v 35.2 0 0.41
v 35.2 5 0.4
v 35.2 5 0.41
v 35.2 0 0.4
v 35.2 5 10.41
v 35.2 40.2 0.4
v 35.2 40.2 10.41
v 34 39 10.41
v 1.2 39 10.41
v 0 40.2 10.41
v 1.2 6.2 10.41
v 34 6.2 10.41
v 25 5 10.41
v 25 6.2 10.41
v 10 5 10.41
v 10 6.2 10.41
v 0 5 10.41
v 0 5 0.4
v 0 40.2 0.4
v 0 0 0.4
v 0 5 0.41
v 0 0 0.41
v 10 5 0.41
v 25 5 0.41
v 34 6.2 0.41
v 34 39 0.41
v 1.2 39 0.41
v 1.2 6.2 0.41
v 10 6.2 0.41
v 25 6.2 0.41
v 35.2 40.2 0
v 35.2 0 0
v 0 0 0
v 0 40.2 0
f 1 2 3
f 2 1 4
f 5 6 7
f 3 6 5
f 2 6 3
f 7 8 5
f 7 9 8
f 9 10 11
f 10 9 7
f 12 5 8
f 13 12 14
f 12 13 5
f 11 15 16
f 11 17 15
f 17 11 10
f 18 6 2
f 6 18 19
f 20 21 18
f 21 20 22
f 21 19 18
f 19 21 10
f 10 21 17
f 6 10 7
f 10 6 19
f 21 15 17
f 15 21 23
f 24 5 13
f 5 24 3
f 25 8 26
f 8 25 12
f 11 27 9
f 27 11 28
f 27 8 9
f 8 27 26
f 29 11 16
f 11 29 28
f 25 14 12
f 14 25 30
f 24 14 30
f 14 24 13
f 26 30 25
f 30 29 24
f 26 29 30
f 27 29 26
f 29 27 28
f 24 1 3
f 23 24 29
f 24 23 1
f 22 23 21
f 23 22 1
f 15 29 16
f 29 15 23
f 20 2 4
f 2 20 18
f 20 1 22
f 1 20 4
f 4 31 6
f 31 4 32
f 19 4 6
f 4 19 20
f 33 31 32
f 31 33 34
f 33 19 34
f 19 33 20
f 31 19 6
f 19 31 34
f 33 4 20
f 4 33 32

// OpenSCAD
// file: ../../Base/Boxes.scad
// Fischertechnik Box Foundation
// Pre-designed Boxes

use <Constants.scad>

include <PlacementOptions.scad>

box190Width = 190;
box190Depth = 130;
box130Width = 130;
box130Depth = 95;
boxUsageHeight = 33.9;
boxWallThickness = 2.4;
boxBaseThickness = 1.0;
boxWebWidth = 3.0;

// getBoxWallThickness()
// Gets the wall thickness of a Fischertechnik Box

function getBoxWallThickness() = boxWallThickness;

// Gets the usable height of a fischertechnik box
function getBoxUsageHeight() = boxUsageHeight;

// Gets the thickness of the Fischertechnik box base.
function getBoxBaseThickness() = boxBaseThickness;

// Gets the width of a box web
function getBoxWebWidth() = boxWebWidth;

// Gets the usable inner space of a Box 190 as an x/y-list
function getBox190Space() = [
    box190Width - 2*getBoxWallThickness(), 
    box190Depth - 2*getBoxWallThickness() ];

// Imports the Fischertechnik empty box 130x190 mm and places it at position 0,0
// 190x130 are the outer sizes, the inner space is slightly smaller. Use getBox190Space() to get the inner sizes.
// This module needs the STL file "Fischertechnik Box 130x190.stl" in the library path.
// The box is positioned that the usable inner space is at the 0,0,0 position. The

module Box190() {
    translate([-getBoxWallThickness(),-getBoxWallThickness(),-getBoxBaseThickness()])
        import("Fischertechnik Box 130x190.stl", convexity=3);
}

// Gets the usable inner space of a Box 130 as an x/y-list
function getBox130Space() = [
    box130Width - 2*getBoxWallThickness(), 
    box130Depth - 2*getBoxWallThickness() ];

// Imports the Fischertechnik empty box 95x130 mm and places it at position 0,0
// 190x130 are the outer sizes, the inner space is slightly smaller. Use getBox190Space() to get the inner sizes.
// This module needs the STL file "Fischertechnik Box 95x130.stl" in the library path.
// The box is positioned that the usable inner space is at the 0,0,0 position. The

module Box130() {
    translate([-getBoxWallThickness(),-getBoxWallThickness(),-getBoxBaseThickness()])
        import("Fischertechnik Box 95x130.stl", convexity=3);
}

// Creates a web at the specified box walls
// corner 0 = LowerLeft, 1 = UpperLeft, 2 = UpperRight, 3 = LowerRight
// side 0 = LeftOfCorner, 1 = RightOfCorner
// distance = Distance in mm from the corner
// box = inner width and depth of the box (default: Box 190)
// webWidth = length of the web (default is 3 mms)
// webThickness = thickness of the web (default is 1 mm)

module BoxWeb(corner, side, distance, box=getBox190Space(), webWidth=getBoxWebWidth(), webThickness=1.0) {
    sink = getBoxWallThickness()/2;

    width = (corner % 2 == 0) ? 
            (side == LeftOfCorner ? webWidth : webThickness) :
            (side == LeftOfCorner ? webThickness : webWidth);

    depth = (corner % 2 == 0) ? 
            (side == RightOfCorner ? webWidth : webThickness) :
            (side == RightOfCorner ? webThickness : webWidth);
    
    xDiff = corner == LowerLeft ? 
                (side == LeftOfCorner ? -sink : distance) :
            (corner == UpperLeft ?                
                (side == LeftOfCorner ? distance : -sink) :
            (corner == UpperRight ?
                (side == LeftOfCorner ? box.x-webWidth+sink : box.x-distance-webThickness) :
                (side == LeftOfCorner ? box.x-distance-webThickness: box.x-webWidth+sink)));

    yDiff = corner == LowerLeft ? 
                (side == RightOfCorner ? -sink : distance) :
            (corner == UpperLeft ?
                (side == RightOfCorner ? box.y-distance : box.y-webWidth+sink) :
            (corner == UpperRight ?
                (side == RightOfCorner ? box.y-webWidth+sink : box.y-distance) :
                (side == RightOfCorner ? distance : -sink)));
    
    translate([xDiff, yDiff, -getExcess()])
        cube([width, depth, boxUsageHeight + 2*getExcess()]);
}
// file: ../../Base/Rotation.scad
// Fischertechnik Box Foundation
// Geometry Helpers Rotation

include <PlacementOptions.scad>

// getRotatedSpace(space, rotation=NoRotation)
// Rotates the space dependent on the specified rotation

function getRotatedSpace(space, rotation=NoRotation) = [
    (rotation == Rotate90 || rotation == Rotate270) ? space.y : space.x,
    (rotation == Rotate90 || rotation == Rotate270) ? space.x : space.y
];

// Rotates the given space around the fixed left lower corner
// space = the space the children needs as width/depth list [width,depth]
// rotation = 0 Rotate0 degrees, 1 Rotate90 degrees, 2 Rotate180 degrees, 3 Rotate270 degrees (equivalent to -90)

module RotateFix(space, rotation=Rotate0) {
    dy = (rotation == Rotate0 || rotation == Rotate270) ? 0 :
        (rotation == Rotate90) ? space.x :
        space.y;
    dx = (rotation < Rotate180) ? 0 :
        (rotation == Rotate180) ? space.x :
        space.y;
    
    translate([dx, dy, 0])
        rotate([0, 0, rotations[rotation]])
            children();
}
// file: ../../Base/Alignment.scad
// Fischertechnik Box Foundation
// Geometry Helpers Alignment

include <PlacementOptions.scad>

// getAlignedX(elementWidth, spaceWidth, align=AlignRight, offset=0)
// Gets the aligned X offset of an element with the given
// width in the given space.
// elementWidth = The width of the element to positon
// spaceWidth = The space where the element should be aligned
// align = 0 AlignLeft, 1 AlignCenter, 2 AlignRight
// offset = an optional offset from the aligned position. When
// aligned left or centered, then positive values are in X direction.
// When aligned right then positive values are in negative X direction.

function getAlignedX(elementWidth, spaceWidth, align=AlignRight, offset=0) =
    (align == AlignLeft) ?
        offset :
        ((align == AlignCenter) ?
        (spaceWidth - elementWidth)/2 + offset :
        spaceWidth - offset - elementWidth);

// getAlignedY(elementDepth, spaceDepth, align=AlignTop, offset=0)
// Gets the aligned Y offset of an element with the given
// depth in the given space.
// elementDepth = The depth of the element to positon
// spaceDepth = The space where the element should be aligned
// align = 0 AlignBottom, 1 AlignCenter, 2 AlignTop
// offset = an optional offset from the aligned position. When
// aligned bottom or centered, then positive values are in Y direction.
// When aligned top then positive values are in negative Y direction.

function getAlignedY(elementDepth, spaceDepth, align=AlignTop, offset=0) =
    (align == AlignBottom) ?
        offset :
        ((align == AlignCenter) ?
        (spaceDepth - elementDepth)/2 + offset :
        spaceDepth - offset - elementDepth);
// file: ../../Base/PlacementOptions.scad
// Fischertechnik Box Foundation
// Placement Options

// Alignment
NoAlign = 0;
AlignLeft = 1;
AlignBottom = 2;
AlignCenter = 3;
AlignRight = 4;
AlignTop = 5;

// Element rotation degree steps
rotations = [0, -90, -180, -270];

// Rotation
NoRotation = 0;
Rotate0 = 0;
Rotate90 = 1;
Rotate180 = 2;
Rotate270 = 3;

// Docking (seen from above)
NoDock = -1;
DockLeft = 0;
DockTop = 1;
DockRight = 2;
DockCorner = 2;
DockBottom = 3;

// Web corners
LowerLeft = 0;
UpperLeft = 1;
UpperRight = 2;
LowerRight = 3;

// Web position relative to corner
LeftOfCorner = 0;
RightOfCorner = 1;
// file: ../../Base/Placement.scad
// Fischertechnik Box Foundation
// Geometry Helpers Placement

use <Constants.scad>
use <Alignment.scad>
use <Rotation.scad>
use <Boxes.scad>

include <PlacementOptions.scad>

// Place(x=0, y=0, elementSpace=[0,0], alignX=AlignLeft, alignY=AlignBottom, rotation=Rotate0, boxSpace=getBox190Space())
// Places the child at the specified position
// y = Y-Position. This is a relative position when an X aligment is specified.
// x = X-Position. This is a relative position when an Y aligment is specified.
// elementSpace = space of the element to be placed [x,y]
// alignX = -1=NoAlign, 0 AlignLeft, 1 AlignCenter, 3 AlignRight (elementSpace and boxSpace required!)
// alignY = -1=NoAlign, 2 AlignBottom, 1 AlignCenter, 4 AlignTop (elementSpace and boxSpace required!)
// rotation = 0 Rotate0 0 degrees, 1 Rotate90 90 degrees, 
// 2 Rotate180 180 degrees, 3 Rotate270 270 degrees (equivalent to -90)
// boxSpace = Inner space of the box where the placement occurs [x,y] - default is Box 190x130 inner space

module Place(x=0, y=0, elementSpace=[0,0], 
  alignX=AlignLeft, alignY=AlignBottom, 
  rotation=NoRotation, boxSpace=getBox190Space()) {

    module Position(x, y, space, rotation=Rotate0) {
        translate([x, y, 0])
            RotateFix(space, rotation)
                children();
    }

    space = getRotatedSpace(elementSpace, rotation);
    alignedX = getAlignedX(space.x, boxSpace.x, alignX, x);
    alignedY = getAlignedY(space.y, boxSpace.y, alignY, y);
    Position(alignedX, alignedY, elementSpace, rotation)
        children();
}

// Center(space=getBox130Space(), elementSpace=[0,0])
// space = Space where the children is centered. For cylinder use centered=true and no elementSpace.
// elementSpace = space of the element to be centered [x,y]

module Center(space=getBox190Space(), elementSpace=[0,0]) {
    translate([(space.x - elementSpace.x) / 2, (space.y - elementSpace.y) / 2])
        children(0);
}

// CenterHorizontal(width=0, y=0, offset=0, space=getBox130Space())
// space = Space where the children is centered. For cylinder use centered=true and no elementSpace.
// elementSpace = space of the element to be centered [x,y]

module CenterHorizontal(width=0, y=0, offset=0, space=getBox190Space()) {
    translate([(space.x - width) / 2 + offset, y])
        children(0);
}

// CenterVertical(depth=0, x=0, offset=0, space=getBox130Space())
// space = Space where the children is centered. For cylinder use centered=true and no elementSpace.
// elementSpace = space of the element to be centered [x,y]

module CenterVertical(depth=0, x=0, offset=0, space=getBox190Space()) {
    translate([x, (space.y - depth) / 2 + offset])
        children(0);
}
// file: ../../Elements/AxisClip10.scad
// Fischertechnik Box Library
// Axis for clip 10
// 31023

use <../ModelBase/Simple.scad>

width = 12;
depth = 12;
height = 23;

// getAxisClip10Space()
// Gets the space of a frame for a clip 10 with spring ring (mot2)

function getAxisClip10Space() = [width, depth, height];

// AxisClip10()
// Axis for clip 10 with spring ring (mot2)

module AxisClip10() {
    LeveledAxisWithSpace(height, height-10, getAxisClip10Space());
}

// Tests
color("lightgray")
AxisClip10();
// file: ../../Base/Constants.scad
// Fischertechnik Box Foundation
// Constants

// Constant values necessary for multiple elements

// Base constants
dividerThickness = 1.2;
excess = 0.01;
fragments = 90;
tolerance = 0.8;

// Gets the thickness of a divider 
function getDividerThickness() = dividerThickness;

// Gets the excess that is used to merge walls into each other
function getExcess() = excess;

// Gets amount of fragments of a cylinder
function getFragments() = fragments;

// Gets the inner tolerance of a frame to each side
function getTolerance() = tolerance;


// Fischertechnik specific constants
axisDiameter = 4;
axisBottomDiameter = axisDiameter + 1;
standardEdgeDistance = 2.5;
standardWebDistance = 11.5;
standardCornerLength = 15;
tubeWallFactor = 0.8;

// Gets axis diameter
function getAxisDiameter() = axisDiameter;

// Gets axis bottom diameter for thicker part at the bottom
function getAxisBottomDiameter() = axisBottomDiameter;

// gets the standard distance to the wall of the box for dockable frames with webs
function getStandardEdgeDistance() = standardEdgeDistance;

// gets the standard distance of each web to the corner of the dockable frame
function getStandardWebDistance() = standardWebDistance;

// gets the standard length of the corner walls of a dockable frame
function getStandardCornerLength() = standardCornerLength;

// gets the wall thickness of a tube.
function getTubeWallThickness() = tubeWallFactor * getDividerThickness();
// file: ../../Elements/FramePushButton.scad
// Fischertechnik Box Library
// Frame for Reverse Switch and Push Button (old)
// 31331, 31332

use <../Base/Constants.scad>
use <../ModelBase/Simple.scad>

width = 32;
depth = 32;
height = 10;
addSwitch = 5;

// getFramePushButtonSpace()
// Gets the space the frame for reverse switch or push button needs as width and depth (.x and .y as a list)

function getFramePushButtonSpace() = getFrameOuterVolume([width, depth + addSwitch, height]);

// FramePushButton()
// The walls of the frame are 13 mm high. 
// The complete frame has a tolerance of addition 1 mm in each direction.

module FramePushButton() {
    cutoffWidth = 15;
    cutoffOffset = 10;
    
    Space(getFramePushButtonSpace());
    
    translate([0, addSwitch, 0])
    difference() {
        Frame([width, depth, height]);
        translate([cutoffOffset, -getDividerThickness()/2, 0])
            cube([cutoffWidth, 2*getDividerThickness(), height + getExcess()]);
    }
}

// Tests
color("lightgray") {
FramePushButton();
}
// file: ../TestPrint.scad
// 3D Print Test Base

use <../Base/Constants.scad>

use <../Elements/AxisClip10.scad>

module TestPrint(elementSpace) {
    cube([elementSpace.x, elementSpace.y, 0.4]);
    translate([0,0,0.4+getExcess()]) {
        children();
    }
}

TestPrint(getAxisClip10Space())
    AxisClip10();
// main file
// 3D Print Test Base
// FramePushButton

use <../TestPrint.scad>
use <../../Elements/FramePushButton.scad>

TestPrint(getFramePushButtonSpace())
    FramePushButton();
